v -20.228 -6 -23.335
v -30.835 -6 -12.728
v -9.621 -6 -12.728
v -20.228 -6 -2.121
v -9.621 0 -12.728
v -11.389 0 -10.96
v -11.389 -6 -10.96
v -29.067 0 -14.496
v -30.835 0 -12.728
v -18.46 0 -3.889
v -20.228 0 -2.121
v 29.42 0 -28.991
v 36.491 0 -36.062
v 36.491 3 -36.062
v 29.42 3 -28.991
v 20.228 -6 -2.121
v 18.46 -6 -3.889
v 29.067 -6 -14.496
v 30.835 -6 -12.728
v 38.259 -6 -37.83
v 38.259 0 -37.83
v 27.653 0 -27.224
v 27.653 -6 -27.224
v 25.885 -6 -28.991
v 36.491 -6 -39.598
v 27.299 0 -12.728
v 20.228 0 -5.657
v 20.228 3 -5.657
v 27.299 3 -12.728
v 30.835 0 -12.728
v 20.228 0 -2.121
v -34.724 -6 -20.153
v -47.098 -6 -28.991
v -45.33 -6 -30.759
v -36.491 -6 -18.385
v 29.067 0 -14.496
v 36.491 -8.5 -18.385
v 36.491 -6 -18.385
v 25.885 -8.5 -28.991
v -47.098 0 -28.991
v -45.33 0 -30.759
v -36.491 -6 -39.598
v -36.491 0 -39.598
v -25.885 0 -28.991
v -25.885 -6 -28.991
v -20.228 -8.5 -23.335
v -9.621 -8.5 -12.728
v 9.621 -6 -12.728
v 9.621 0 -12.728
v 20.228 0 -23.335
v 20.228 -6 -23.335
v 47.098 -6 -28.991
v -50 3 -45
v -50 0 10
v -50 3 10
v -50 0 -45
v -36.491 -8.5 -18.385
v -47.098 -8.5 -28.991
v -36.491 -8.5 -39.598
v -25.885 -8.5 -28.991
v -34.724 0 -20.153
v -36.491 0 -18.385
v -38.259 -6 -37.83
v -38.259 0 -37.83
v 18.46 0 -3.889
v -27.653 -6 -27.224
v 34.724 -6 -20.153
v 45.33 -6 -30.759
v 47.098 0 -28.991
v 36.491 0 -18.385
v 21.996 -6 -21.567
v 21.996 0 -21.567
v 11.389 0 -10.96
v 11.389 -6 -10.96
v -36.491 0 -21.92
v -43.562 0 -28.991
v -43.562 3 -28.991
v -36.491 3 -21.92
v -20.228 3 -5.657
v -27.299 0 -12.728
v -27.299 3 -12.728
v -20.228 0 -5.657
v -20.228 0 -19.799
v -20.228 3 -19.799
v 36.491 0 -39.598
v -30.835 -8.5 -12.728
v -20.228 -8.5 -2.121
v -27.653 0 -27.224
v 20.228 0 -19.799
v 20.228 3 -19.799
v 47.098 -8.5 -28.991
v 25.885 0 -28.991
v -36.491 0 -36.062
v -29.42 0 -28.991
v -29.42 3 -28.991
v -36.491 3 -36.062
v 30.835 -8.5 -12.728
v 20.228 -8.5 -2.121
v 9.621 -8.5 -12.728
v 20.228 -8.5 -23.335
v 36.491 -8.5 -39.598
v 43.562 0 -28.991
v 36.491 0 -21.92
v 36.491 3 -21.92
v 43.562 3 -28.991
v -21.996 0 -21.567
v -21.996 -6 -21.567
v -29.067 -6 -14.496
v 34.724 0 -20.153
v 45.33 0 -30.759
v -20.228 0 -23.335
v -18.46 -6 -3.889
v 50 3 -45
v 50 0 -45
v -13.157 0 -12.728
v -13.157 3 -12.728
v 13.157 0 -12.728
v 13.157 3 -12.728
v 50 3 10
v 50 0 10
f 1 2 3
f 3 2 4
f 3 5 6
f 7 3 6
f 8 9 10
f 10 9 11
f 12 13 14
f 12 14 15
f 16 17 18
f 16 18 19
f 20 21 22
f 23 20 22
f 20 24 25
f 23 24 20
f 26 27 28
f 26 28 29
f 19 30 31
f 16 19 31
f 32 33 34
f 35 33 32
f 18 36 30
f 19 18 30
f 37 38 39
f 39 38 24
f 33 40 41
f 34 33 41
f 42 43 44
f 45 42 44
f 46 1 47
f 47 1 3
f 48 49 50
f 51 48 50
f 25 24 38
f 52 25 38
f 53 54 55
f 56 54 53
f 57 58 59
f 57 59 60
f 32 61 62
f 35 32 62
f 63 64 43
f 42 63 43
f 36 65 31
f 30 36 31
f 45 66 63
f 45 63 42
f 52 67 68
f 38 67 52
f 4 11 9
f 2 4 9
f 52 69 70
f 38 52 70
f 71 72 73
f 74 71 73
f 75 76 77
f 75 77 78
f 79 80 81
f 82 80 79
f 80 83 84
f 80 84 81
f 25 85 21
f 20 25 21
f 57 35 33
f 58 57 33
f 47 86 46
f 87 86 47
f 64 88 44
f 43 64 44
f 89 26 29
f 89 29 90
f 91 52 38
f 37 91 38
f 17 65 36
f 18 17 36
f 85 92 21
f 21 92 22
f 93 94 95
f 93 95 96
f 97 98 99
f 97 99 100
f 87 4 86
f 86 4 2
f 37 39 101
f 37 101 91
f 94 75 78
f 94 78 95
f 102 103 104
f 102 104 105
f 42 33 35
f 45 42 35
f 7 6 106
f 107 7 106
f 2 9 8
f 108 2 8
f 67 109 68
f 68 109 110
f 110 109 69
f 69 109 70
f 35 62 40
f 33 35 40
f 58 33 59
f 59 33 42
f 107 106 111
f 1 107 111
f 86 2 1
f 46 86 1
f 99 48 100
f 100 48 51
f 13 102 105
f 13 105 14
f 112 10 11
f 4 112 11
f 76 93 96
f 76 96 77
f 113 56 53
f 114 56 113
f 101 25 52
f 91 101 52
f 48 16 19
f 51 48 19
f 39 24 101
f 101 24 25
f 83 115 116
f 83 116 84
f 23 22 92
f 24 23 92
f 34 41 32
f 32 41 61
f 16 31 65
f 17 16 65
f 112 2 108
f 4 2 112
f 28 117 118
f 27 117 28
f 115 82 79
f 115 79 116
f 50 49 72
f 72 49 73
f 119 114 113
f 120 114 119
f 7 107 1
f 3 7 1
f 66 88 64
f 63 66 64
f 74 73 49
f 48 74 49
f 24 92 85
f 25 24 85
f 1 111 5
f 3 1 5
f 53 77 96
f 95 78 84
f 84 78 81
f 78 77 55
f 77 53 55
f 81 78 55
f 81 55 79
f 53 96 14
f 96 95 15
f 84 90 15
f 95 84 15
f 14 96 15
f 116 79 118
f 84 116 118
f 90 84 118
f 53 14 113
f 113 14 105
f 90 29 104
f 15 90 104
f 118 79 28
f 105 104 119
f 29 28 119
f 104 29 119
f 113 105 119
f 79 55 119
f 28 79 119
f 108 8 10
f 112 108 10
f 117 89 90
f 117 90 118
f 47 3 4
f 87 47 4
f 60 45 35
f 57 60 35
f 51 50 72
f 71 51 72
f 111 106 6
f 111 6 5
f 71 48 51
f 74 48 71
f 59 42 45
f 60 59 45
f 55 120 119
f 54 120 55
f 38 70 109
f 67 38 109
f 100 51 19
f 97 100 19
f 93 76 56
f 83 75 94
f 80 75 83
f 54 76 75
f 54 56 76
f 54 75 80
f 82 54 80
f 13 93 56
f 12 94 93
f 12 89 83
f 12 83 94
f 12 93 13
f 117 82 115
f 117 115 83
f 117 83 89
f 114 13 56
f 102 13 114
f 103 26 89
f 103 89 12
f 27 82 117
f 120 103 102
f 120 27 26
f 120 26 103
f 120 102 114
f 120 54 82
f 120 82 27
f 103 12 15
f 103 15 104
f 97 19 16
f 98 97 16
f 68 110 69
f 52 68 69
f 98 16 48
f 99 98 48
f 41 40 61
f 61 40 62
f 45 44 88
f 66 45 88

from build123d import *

# Parameters (mm, degrees)
F2_DEPTH = 6
F4_DEPTH = 2.5
F0_W     = 50
F0_H     = 45
F5_DEPTH = 3


with BuildPart() as f2:
    # F1 (on face) → F2 (new body)
    with BuildSketch(Plane.XZ):
        Polygon((-27.29899, -12.727922), (-20.227922, -5.656854), (-18.460155, -3.889087), (-20.227922, -2.12132), (-30.834524, -12.727922), (-29.066757, -14.495689), align=None)
        Polygon((-11.389087, -10.960155), (-13.156854, -12.727922), (-20.227922, -19.79899), (-21.995689, -21.566757), (-20.227922, -23.334524), (-9.62132, -12.727922), align=None)
        Polygon((-43.562446, -28.991378), (-36.491378, -21.92031), (-34.723611, -20.152543), (-36.491378, -18.384776), (-47.09798, -28.991378), (-45.330213, -30.759145), align=None)
        Polygon((-27.652543, -27.223611), (-29.42031, -28.991378), (-36.491378, -36.062446), (-38.259145, -37.830213), (-36.491378, -39.59798), (-25.884776, -28.991378), align=None)
        Polygon((36.491378, -21.92031), (43.562446, -28.991378), (45.330213, -30.759145), (47.09798, -28.991378), (36.491378, -18.384776), (34.723611, -20.152543), align=None)
        Polygon((38.259145, -37.830213), (36.491378, -36.062446), (29.42031, -28.991378), (27.652543, -27.223611), (25.884776, -28.991378), (36.491378, -39.59798), align=None)
        Polygon((20.227922, -19.79899), (13.156854, -12.727922), (11.389087, -10.960155), (9.62132, -12.727922), (20.227922, -23.334524), (21.995689, -21.566757), align=None)
        Polygon((18.460155, -3.889087), (20.227922, -5.656854), (27.29899, -12.727922), (29.066757, -14.495689), (30.834524, -12.727922), (20.227922, -2.12132), align=None)
    extrude(amount=F2_DEPTH)


with BuildPart() as f4:
    # F3 (on face) → F4 (new body)
    with BuildSketch(Plane.XZ.offset(6)):
        Polygon((-25.884776, -28.991378), (-36.491378, -18.384776), (-47.09798, -28.991378), (-36.491378, -39.59798), align=None)
        Polygon((-18.460155, -3.889087), (-20.227922, -2.12132), (-30.834524, -12.727922), (-29.066757, -14.495689), align=None)
        Polygon((-9.62132, -12.727922), (-18.460155, -3.889087), (-29.066757, -14.495689), (-20.227922, -23.334524), align=None)
        Polygon((20.227922, -2.12132), (9.62132, -12.727922), (20.227922, -23.334524), (30.834524, -12.727922), align=None)
        Polygon((47.09798, -28.991378), (36.491378, -18.384776), (25.884776, -28.991378), (36.491378, -39.59798), align=None)
    extrude(amount=F4_DEPTH)


with BuildPart() as f5:
    # F0 (on Front) → F5 (new body)
    with BuildSketch(Plane.XZ):
        Polygon((0, 0), (50, 0), (50, 10), (-50, 10), (-50, 0), align=None)
        with Locations((25, -22.5)):
            Rectangle(F0_W, F0_H)
        Polygon((36.491378, -36.062446), (29.42031, -28.991378), (36.491378, -21.92031), (43.562446, -28.991378), align=None, mode=Mode.SUBTRACT)
        Polygon((20.227922, -19.79899), (13.156854, -12.727922), (20.227922, -5.656854), (27.29899, -12.727922), align=None, mode=Mode.SUBTRACT)
        with Locations((-25, -22.5)):
            Rectangle(F0_W, F0_H)
        Polygon((-43.562446, -28.991378), (-36.491378, -21.92031), (-29.42031, -28.991378), (-36.491378, -36.062446), align=None, mode=Mode.SUBTRACT)
        Polygon((-27.29899, -12.727922), (-20.227922, -5.656854), (-13.156854, -12.727922), (-20.227922, -19.79899), align=None, mode=Mode.SUBTRACT)
    extrude(amount=-F5_DEPTH)


solid = Compound([f2.part, f4.part, f5.part])
